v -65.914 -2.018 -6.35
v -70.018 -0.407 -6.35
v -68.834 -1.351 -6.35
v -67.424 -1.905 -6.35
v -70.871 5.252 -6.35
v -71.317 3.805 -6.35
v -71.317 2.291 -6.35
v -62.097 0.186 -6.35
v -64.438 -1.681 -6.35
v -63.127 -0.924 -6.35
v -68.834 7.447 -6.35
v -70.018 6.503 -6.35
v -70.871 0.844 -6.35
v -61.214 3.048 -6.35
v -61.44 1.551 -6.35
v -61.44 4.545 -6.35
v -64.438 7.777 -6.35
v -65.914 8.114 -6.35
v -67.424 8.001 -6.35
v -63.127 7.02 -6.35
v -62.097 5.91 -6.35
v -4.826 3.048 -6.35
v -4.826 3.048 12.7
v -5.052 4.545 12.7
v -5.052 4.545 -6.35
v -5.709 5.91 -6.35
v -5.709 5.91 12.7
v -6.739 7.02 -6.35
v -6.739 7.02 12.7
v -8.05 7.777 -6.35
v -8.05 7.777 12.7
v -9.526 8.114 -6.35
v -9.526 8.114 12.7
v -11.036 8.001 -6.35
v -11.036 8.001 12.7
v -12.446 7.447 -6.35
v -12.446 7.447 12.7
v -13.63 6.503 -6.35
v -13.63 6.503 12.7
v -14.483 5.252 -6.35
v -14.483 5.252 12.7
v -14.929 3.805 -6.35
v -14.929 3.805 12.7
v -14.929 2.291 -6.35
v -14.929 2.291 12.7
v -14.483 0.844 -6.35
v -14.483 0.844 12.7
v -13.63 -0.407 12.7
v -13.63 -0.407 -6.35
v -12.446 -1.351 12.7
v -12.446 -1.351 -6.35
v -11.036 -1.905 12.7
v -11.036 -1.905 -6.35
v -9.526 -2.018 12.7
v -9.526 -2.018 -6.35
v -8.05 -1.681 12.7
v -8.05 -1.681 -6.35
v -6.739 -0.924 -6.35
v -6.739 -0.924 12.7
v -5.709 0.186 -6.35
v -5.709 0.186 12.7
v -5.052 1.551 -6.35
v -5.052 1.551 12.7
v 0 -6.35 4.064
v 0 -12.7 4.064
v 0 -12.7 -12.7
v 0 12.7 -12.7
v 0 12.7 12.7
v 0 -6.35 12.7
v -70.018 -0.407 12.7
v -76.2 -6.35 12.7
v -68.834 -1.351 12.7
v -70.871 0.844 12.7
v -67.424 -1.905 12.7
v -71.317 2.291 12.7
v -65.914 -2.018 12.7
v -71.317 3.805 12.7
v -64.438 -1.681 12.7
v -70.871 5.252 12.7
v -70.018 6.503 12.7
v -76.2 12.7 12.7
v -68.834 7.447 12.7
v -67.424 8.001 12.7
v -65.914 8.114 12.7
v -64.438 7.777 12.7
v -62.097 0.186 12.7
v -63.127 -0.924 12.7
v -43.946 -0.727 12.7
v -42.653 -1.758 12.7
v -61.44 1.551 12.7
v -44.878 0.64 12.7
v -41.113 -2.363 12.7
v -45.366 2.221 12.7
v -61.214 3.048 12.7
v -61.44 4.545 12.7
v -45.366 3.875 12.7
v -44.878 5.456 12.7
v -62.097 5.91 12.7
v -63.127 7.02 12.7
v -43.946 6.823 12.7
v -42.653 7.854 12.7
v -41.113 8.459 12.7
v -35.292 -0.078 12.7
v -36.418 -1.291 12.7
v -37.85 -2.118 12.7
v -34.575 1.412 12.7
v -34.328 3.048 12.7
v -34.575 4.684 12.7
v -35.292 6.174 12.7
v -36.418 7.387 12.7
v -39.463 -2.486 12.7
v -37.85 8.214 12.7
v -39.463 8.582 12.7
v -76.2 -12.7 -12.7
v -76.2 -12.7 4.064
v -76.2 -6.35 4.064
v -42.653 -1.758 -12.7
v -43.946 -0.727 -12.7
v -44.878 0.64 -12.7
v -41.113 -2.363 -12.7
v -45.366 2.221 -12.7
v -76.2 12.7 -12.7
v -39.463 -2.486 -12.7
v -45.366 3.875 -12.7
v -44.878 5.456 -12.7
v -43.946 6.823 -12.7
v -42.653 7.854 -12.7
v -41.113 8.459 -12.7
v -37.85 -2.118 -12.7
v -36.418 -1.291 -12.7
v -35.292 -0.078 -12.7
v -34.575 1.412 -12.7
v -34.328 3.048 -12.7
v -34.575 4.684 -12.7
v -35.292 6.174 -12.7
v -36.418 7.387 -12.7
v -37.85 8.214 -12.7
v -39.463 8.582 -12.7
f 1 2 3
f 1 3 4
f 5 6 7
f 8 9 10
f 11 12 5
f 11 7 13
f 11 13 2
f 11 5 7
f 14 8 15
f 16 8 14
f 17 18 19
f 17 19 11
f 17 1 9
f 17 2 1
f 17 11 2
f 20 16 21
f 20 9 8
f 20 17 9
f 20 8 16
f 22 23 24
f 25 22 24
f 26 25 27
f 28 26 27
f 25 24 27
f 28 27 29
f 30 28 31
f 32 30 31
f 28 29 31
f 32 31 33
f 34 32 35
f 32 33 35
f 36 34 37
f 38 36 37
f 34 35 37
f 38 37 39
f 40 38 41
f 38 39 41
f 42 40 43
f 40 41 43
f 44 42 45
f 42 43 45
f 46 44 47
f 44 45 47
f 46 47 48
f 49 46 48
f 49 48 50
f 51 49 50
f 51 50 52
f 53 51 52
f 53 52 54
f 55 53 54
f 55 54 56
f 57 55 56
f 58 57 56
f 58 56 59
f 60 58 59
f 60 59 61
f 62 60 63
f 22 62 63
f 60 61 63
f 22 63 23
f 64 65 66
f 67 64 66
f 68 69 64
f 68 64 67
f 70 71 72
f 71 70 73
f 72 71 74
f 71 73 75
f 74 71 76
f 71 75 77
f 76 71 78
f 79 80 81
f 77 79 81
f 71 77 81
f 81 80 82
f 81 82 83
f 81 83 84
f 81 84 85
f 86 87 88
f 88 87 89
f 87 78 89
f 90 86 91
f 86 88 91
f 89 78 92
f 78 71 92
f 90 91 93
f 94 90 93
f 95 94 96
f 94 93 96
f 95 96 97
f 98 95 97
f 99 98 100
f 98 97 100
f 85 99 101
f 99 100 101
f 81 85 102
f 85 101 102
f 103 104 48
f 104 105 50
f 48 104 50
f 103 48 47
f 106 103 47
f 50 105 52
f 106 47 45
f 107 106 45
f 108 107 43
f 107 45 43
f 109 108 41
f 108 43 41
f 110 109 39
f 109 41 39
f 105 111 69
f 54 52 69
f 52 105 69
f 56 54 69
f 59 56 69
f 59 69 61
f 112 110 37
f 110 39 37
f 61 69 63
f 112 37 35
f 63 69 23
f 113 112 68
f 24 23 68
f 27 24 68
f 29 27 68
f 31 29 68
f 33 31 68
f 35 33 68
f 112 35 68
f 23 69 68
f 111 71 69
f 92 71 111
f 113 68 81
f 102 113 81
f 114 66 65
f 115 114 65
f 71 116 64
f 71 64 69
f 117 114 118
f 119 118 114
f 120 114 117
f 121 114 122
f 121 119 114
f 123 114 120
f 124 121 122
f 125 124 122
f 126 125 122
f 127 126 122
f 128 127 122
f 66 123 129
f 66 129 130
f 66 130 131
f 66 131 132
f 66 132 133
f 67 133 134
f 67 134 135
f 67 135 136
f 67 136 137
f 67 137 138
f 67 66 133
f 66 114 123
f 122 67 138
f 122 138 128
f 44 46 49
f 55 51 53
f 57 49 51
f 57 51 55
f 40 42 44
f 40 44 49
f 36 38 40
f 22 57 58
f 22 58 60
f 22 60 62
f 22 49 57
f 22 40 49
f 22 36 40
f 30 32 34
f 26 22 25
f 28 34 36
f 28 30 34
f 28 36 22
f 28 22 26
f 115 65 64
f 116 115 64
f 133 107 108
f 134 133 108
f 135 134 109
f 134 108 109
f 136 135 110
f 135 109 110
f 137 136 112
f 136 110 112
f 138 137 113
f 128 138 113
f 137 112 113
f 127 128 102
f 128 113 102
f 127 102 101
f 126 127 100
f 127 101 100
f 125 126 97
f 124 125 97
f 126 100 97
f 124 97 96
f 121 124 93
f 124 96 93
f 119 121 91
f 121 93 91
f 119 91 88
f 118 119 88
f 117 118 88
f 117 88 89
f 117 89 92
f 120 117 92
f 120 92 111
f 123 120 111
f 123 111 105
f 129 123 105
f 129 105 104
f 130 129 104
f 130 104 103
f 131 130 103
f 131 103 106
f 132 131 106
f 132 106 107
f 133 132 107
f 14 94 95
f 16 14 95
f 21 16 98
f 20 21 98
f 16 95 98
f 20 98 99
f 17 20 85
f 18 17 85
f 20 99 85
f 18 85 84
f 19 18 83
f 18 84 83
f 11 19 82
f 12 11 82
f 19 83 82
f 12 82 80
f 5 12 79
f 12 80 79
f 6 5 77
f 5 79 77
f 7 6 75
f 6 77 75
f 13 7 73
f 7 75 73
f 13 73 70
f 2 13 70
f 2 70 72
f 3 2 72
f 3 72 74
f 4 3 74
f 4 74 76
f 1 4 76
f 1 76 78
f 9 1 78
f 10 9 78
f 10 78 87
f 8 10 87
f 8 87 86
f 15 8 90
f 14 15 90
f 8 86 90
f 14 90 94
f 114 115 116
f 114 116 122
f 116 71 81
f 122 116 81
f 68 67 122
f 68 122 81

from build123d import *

# Parameters (mm, degrees)
F0_W     = 25.4
F0_H     = 25.4
F1_DEPTH = 76.2
F2_W     = 6.35
F2_H     = 8.636
F3_DEPTH = 76.2
F4_R     = 5.08
F5_DEPTH = 19.05
F6_R     = 5.5499
F7_DEPTH = 73.406


with BuildPart() as f1:
    # F0 (on Right) → F1 (new body)
    with BuildSketch(Plane.YZ):
        Rectangle(F0_W, F0_H)
    extrude(amount=-F1_DEPTH)

    # F2 (on Right) → F3 (cut)
    with BuildSketch(Plane.YZ):
        with Locations((-9.525, 8.382)):
            Rectangle(F2_W, F2_H)
    extrude(amount=-F3_DEPTH, mode=Mode.SUBTRACT)

    # F4 (on face) → F5 (cut)
    with BuildSketch(Plane.XY.offset(12.7)):
        with Locations((-66.294, 3.048)):
            Circle(F4_R)
        with Locations((-9.906, 3.048)):
            Circle(F4_R)
    extrude(amount=-F5_DEPTH, mode=Mode.SUBTRACT)

    # F6 (on face) → F7 (cut)
    with BuildSketch(Plane.XY.offset(12.7)):
        with Locations((-39.878, 3.048)):
            Circle(F6_R)
    extrude(amount=-F7_DEPTH, mode=Mode.SUBTRACT)


solid = f1.part
